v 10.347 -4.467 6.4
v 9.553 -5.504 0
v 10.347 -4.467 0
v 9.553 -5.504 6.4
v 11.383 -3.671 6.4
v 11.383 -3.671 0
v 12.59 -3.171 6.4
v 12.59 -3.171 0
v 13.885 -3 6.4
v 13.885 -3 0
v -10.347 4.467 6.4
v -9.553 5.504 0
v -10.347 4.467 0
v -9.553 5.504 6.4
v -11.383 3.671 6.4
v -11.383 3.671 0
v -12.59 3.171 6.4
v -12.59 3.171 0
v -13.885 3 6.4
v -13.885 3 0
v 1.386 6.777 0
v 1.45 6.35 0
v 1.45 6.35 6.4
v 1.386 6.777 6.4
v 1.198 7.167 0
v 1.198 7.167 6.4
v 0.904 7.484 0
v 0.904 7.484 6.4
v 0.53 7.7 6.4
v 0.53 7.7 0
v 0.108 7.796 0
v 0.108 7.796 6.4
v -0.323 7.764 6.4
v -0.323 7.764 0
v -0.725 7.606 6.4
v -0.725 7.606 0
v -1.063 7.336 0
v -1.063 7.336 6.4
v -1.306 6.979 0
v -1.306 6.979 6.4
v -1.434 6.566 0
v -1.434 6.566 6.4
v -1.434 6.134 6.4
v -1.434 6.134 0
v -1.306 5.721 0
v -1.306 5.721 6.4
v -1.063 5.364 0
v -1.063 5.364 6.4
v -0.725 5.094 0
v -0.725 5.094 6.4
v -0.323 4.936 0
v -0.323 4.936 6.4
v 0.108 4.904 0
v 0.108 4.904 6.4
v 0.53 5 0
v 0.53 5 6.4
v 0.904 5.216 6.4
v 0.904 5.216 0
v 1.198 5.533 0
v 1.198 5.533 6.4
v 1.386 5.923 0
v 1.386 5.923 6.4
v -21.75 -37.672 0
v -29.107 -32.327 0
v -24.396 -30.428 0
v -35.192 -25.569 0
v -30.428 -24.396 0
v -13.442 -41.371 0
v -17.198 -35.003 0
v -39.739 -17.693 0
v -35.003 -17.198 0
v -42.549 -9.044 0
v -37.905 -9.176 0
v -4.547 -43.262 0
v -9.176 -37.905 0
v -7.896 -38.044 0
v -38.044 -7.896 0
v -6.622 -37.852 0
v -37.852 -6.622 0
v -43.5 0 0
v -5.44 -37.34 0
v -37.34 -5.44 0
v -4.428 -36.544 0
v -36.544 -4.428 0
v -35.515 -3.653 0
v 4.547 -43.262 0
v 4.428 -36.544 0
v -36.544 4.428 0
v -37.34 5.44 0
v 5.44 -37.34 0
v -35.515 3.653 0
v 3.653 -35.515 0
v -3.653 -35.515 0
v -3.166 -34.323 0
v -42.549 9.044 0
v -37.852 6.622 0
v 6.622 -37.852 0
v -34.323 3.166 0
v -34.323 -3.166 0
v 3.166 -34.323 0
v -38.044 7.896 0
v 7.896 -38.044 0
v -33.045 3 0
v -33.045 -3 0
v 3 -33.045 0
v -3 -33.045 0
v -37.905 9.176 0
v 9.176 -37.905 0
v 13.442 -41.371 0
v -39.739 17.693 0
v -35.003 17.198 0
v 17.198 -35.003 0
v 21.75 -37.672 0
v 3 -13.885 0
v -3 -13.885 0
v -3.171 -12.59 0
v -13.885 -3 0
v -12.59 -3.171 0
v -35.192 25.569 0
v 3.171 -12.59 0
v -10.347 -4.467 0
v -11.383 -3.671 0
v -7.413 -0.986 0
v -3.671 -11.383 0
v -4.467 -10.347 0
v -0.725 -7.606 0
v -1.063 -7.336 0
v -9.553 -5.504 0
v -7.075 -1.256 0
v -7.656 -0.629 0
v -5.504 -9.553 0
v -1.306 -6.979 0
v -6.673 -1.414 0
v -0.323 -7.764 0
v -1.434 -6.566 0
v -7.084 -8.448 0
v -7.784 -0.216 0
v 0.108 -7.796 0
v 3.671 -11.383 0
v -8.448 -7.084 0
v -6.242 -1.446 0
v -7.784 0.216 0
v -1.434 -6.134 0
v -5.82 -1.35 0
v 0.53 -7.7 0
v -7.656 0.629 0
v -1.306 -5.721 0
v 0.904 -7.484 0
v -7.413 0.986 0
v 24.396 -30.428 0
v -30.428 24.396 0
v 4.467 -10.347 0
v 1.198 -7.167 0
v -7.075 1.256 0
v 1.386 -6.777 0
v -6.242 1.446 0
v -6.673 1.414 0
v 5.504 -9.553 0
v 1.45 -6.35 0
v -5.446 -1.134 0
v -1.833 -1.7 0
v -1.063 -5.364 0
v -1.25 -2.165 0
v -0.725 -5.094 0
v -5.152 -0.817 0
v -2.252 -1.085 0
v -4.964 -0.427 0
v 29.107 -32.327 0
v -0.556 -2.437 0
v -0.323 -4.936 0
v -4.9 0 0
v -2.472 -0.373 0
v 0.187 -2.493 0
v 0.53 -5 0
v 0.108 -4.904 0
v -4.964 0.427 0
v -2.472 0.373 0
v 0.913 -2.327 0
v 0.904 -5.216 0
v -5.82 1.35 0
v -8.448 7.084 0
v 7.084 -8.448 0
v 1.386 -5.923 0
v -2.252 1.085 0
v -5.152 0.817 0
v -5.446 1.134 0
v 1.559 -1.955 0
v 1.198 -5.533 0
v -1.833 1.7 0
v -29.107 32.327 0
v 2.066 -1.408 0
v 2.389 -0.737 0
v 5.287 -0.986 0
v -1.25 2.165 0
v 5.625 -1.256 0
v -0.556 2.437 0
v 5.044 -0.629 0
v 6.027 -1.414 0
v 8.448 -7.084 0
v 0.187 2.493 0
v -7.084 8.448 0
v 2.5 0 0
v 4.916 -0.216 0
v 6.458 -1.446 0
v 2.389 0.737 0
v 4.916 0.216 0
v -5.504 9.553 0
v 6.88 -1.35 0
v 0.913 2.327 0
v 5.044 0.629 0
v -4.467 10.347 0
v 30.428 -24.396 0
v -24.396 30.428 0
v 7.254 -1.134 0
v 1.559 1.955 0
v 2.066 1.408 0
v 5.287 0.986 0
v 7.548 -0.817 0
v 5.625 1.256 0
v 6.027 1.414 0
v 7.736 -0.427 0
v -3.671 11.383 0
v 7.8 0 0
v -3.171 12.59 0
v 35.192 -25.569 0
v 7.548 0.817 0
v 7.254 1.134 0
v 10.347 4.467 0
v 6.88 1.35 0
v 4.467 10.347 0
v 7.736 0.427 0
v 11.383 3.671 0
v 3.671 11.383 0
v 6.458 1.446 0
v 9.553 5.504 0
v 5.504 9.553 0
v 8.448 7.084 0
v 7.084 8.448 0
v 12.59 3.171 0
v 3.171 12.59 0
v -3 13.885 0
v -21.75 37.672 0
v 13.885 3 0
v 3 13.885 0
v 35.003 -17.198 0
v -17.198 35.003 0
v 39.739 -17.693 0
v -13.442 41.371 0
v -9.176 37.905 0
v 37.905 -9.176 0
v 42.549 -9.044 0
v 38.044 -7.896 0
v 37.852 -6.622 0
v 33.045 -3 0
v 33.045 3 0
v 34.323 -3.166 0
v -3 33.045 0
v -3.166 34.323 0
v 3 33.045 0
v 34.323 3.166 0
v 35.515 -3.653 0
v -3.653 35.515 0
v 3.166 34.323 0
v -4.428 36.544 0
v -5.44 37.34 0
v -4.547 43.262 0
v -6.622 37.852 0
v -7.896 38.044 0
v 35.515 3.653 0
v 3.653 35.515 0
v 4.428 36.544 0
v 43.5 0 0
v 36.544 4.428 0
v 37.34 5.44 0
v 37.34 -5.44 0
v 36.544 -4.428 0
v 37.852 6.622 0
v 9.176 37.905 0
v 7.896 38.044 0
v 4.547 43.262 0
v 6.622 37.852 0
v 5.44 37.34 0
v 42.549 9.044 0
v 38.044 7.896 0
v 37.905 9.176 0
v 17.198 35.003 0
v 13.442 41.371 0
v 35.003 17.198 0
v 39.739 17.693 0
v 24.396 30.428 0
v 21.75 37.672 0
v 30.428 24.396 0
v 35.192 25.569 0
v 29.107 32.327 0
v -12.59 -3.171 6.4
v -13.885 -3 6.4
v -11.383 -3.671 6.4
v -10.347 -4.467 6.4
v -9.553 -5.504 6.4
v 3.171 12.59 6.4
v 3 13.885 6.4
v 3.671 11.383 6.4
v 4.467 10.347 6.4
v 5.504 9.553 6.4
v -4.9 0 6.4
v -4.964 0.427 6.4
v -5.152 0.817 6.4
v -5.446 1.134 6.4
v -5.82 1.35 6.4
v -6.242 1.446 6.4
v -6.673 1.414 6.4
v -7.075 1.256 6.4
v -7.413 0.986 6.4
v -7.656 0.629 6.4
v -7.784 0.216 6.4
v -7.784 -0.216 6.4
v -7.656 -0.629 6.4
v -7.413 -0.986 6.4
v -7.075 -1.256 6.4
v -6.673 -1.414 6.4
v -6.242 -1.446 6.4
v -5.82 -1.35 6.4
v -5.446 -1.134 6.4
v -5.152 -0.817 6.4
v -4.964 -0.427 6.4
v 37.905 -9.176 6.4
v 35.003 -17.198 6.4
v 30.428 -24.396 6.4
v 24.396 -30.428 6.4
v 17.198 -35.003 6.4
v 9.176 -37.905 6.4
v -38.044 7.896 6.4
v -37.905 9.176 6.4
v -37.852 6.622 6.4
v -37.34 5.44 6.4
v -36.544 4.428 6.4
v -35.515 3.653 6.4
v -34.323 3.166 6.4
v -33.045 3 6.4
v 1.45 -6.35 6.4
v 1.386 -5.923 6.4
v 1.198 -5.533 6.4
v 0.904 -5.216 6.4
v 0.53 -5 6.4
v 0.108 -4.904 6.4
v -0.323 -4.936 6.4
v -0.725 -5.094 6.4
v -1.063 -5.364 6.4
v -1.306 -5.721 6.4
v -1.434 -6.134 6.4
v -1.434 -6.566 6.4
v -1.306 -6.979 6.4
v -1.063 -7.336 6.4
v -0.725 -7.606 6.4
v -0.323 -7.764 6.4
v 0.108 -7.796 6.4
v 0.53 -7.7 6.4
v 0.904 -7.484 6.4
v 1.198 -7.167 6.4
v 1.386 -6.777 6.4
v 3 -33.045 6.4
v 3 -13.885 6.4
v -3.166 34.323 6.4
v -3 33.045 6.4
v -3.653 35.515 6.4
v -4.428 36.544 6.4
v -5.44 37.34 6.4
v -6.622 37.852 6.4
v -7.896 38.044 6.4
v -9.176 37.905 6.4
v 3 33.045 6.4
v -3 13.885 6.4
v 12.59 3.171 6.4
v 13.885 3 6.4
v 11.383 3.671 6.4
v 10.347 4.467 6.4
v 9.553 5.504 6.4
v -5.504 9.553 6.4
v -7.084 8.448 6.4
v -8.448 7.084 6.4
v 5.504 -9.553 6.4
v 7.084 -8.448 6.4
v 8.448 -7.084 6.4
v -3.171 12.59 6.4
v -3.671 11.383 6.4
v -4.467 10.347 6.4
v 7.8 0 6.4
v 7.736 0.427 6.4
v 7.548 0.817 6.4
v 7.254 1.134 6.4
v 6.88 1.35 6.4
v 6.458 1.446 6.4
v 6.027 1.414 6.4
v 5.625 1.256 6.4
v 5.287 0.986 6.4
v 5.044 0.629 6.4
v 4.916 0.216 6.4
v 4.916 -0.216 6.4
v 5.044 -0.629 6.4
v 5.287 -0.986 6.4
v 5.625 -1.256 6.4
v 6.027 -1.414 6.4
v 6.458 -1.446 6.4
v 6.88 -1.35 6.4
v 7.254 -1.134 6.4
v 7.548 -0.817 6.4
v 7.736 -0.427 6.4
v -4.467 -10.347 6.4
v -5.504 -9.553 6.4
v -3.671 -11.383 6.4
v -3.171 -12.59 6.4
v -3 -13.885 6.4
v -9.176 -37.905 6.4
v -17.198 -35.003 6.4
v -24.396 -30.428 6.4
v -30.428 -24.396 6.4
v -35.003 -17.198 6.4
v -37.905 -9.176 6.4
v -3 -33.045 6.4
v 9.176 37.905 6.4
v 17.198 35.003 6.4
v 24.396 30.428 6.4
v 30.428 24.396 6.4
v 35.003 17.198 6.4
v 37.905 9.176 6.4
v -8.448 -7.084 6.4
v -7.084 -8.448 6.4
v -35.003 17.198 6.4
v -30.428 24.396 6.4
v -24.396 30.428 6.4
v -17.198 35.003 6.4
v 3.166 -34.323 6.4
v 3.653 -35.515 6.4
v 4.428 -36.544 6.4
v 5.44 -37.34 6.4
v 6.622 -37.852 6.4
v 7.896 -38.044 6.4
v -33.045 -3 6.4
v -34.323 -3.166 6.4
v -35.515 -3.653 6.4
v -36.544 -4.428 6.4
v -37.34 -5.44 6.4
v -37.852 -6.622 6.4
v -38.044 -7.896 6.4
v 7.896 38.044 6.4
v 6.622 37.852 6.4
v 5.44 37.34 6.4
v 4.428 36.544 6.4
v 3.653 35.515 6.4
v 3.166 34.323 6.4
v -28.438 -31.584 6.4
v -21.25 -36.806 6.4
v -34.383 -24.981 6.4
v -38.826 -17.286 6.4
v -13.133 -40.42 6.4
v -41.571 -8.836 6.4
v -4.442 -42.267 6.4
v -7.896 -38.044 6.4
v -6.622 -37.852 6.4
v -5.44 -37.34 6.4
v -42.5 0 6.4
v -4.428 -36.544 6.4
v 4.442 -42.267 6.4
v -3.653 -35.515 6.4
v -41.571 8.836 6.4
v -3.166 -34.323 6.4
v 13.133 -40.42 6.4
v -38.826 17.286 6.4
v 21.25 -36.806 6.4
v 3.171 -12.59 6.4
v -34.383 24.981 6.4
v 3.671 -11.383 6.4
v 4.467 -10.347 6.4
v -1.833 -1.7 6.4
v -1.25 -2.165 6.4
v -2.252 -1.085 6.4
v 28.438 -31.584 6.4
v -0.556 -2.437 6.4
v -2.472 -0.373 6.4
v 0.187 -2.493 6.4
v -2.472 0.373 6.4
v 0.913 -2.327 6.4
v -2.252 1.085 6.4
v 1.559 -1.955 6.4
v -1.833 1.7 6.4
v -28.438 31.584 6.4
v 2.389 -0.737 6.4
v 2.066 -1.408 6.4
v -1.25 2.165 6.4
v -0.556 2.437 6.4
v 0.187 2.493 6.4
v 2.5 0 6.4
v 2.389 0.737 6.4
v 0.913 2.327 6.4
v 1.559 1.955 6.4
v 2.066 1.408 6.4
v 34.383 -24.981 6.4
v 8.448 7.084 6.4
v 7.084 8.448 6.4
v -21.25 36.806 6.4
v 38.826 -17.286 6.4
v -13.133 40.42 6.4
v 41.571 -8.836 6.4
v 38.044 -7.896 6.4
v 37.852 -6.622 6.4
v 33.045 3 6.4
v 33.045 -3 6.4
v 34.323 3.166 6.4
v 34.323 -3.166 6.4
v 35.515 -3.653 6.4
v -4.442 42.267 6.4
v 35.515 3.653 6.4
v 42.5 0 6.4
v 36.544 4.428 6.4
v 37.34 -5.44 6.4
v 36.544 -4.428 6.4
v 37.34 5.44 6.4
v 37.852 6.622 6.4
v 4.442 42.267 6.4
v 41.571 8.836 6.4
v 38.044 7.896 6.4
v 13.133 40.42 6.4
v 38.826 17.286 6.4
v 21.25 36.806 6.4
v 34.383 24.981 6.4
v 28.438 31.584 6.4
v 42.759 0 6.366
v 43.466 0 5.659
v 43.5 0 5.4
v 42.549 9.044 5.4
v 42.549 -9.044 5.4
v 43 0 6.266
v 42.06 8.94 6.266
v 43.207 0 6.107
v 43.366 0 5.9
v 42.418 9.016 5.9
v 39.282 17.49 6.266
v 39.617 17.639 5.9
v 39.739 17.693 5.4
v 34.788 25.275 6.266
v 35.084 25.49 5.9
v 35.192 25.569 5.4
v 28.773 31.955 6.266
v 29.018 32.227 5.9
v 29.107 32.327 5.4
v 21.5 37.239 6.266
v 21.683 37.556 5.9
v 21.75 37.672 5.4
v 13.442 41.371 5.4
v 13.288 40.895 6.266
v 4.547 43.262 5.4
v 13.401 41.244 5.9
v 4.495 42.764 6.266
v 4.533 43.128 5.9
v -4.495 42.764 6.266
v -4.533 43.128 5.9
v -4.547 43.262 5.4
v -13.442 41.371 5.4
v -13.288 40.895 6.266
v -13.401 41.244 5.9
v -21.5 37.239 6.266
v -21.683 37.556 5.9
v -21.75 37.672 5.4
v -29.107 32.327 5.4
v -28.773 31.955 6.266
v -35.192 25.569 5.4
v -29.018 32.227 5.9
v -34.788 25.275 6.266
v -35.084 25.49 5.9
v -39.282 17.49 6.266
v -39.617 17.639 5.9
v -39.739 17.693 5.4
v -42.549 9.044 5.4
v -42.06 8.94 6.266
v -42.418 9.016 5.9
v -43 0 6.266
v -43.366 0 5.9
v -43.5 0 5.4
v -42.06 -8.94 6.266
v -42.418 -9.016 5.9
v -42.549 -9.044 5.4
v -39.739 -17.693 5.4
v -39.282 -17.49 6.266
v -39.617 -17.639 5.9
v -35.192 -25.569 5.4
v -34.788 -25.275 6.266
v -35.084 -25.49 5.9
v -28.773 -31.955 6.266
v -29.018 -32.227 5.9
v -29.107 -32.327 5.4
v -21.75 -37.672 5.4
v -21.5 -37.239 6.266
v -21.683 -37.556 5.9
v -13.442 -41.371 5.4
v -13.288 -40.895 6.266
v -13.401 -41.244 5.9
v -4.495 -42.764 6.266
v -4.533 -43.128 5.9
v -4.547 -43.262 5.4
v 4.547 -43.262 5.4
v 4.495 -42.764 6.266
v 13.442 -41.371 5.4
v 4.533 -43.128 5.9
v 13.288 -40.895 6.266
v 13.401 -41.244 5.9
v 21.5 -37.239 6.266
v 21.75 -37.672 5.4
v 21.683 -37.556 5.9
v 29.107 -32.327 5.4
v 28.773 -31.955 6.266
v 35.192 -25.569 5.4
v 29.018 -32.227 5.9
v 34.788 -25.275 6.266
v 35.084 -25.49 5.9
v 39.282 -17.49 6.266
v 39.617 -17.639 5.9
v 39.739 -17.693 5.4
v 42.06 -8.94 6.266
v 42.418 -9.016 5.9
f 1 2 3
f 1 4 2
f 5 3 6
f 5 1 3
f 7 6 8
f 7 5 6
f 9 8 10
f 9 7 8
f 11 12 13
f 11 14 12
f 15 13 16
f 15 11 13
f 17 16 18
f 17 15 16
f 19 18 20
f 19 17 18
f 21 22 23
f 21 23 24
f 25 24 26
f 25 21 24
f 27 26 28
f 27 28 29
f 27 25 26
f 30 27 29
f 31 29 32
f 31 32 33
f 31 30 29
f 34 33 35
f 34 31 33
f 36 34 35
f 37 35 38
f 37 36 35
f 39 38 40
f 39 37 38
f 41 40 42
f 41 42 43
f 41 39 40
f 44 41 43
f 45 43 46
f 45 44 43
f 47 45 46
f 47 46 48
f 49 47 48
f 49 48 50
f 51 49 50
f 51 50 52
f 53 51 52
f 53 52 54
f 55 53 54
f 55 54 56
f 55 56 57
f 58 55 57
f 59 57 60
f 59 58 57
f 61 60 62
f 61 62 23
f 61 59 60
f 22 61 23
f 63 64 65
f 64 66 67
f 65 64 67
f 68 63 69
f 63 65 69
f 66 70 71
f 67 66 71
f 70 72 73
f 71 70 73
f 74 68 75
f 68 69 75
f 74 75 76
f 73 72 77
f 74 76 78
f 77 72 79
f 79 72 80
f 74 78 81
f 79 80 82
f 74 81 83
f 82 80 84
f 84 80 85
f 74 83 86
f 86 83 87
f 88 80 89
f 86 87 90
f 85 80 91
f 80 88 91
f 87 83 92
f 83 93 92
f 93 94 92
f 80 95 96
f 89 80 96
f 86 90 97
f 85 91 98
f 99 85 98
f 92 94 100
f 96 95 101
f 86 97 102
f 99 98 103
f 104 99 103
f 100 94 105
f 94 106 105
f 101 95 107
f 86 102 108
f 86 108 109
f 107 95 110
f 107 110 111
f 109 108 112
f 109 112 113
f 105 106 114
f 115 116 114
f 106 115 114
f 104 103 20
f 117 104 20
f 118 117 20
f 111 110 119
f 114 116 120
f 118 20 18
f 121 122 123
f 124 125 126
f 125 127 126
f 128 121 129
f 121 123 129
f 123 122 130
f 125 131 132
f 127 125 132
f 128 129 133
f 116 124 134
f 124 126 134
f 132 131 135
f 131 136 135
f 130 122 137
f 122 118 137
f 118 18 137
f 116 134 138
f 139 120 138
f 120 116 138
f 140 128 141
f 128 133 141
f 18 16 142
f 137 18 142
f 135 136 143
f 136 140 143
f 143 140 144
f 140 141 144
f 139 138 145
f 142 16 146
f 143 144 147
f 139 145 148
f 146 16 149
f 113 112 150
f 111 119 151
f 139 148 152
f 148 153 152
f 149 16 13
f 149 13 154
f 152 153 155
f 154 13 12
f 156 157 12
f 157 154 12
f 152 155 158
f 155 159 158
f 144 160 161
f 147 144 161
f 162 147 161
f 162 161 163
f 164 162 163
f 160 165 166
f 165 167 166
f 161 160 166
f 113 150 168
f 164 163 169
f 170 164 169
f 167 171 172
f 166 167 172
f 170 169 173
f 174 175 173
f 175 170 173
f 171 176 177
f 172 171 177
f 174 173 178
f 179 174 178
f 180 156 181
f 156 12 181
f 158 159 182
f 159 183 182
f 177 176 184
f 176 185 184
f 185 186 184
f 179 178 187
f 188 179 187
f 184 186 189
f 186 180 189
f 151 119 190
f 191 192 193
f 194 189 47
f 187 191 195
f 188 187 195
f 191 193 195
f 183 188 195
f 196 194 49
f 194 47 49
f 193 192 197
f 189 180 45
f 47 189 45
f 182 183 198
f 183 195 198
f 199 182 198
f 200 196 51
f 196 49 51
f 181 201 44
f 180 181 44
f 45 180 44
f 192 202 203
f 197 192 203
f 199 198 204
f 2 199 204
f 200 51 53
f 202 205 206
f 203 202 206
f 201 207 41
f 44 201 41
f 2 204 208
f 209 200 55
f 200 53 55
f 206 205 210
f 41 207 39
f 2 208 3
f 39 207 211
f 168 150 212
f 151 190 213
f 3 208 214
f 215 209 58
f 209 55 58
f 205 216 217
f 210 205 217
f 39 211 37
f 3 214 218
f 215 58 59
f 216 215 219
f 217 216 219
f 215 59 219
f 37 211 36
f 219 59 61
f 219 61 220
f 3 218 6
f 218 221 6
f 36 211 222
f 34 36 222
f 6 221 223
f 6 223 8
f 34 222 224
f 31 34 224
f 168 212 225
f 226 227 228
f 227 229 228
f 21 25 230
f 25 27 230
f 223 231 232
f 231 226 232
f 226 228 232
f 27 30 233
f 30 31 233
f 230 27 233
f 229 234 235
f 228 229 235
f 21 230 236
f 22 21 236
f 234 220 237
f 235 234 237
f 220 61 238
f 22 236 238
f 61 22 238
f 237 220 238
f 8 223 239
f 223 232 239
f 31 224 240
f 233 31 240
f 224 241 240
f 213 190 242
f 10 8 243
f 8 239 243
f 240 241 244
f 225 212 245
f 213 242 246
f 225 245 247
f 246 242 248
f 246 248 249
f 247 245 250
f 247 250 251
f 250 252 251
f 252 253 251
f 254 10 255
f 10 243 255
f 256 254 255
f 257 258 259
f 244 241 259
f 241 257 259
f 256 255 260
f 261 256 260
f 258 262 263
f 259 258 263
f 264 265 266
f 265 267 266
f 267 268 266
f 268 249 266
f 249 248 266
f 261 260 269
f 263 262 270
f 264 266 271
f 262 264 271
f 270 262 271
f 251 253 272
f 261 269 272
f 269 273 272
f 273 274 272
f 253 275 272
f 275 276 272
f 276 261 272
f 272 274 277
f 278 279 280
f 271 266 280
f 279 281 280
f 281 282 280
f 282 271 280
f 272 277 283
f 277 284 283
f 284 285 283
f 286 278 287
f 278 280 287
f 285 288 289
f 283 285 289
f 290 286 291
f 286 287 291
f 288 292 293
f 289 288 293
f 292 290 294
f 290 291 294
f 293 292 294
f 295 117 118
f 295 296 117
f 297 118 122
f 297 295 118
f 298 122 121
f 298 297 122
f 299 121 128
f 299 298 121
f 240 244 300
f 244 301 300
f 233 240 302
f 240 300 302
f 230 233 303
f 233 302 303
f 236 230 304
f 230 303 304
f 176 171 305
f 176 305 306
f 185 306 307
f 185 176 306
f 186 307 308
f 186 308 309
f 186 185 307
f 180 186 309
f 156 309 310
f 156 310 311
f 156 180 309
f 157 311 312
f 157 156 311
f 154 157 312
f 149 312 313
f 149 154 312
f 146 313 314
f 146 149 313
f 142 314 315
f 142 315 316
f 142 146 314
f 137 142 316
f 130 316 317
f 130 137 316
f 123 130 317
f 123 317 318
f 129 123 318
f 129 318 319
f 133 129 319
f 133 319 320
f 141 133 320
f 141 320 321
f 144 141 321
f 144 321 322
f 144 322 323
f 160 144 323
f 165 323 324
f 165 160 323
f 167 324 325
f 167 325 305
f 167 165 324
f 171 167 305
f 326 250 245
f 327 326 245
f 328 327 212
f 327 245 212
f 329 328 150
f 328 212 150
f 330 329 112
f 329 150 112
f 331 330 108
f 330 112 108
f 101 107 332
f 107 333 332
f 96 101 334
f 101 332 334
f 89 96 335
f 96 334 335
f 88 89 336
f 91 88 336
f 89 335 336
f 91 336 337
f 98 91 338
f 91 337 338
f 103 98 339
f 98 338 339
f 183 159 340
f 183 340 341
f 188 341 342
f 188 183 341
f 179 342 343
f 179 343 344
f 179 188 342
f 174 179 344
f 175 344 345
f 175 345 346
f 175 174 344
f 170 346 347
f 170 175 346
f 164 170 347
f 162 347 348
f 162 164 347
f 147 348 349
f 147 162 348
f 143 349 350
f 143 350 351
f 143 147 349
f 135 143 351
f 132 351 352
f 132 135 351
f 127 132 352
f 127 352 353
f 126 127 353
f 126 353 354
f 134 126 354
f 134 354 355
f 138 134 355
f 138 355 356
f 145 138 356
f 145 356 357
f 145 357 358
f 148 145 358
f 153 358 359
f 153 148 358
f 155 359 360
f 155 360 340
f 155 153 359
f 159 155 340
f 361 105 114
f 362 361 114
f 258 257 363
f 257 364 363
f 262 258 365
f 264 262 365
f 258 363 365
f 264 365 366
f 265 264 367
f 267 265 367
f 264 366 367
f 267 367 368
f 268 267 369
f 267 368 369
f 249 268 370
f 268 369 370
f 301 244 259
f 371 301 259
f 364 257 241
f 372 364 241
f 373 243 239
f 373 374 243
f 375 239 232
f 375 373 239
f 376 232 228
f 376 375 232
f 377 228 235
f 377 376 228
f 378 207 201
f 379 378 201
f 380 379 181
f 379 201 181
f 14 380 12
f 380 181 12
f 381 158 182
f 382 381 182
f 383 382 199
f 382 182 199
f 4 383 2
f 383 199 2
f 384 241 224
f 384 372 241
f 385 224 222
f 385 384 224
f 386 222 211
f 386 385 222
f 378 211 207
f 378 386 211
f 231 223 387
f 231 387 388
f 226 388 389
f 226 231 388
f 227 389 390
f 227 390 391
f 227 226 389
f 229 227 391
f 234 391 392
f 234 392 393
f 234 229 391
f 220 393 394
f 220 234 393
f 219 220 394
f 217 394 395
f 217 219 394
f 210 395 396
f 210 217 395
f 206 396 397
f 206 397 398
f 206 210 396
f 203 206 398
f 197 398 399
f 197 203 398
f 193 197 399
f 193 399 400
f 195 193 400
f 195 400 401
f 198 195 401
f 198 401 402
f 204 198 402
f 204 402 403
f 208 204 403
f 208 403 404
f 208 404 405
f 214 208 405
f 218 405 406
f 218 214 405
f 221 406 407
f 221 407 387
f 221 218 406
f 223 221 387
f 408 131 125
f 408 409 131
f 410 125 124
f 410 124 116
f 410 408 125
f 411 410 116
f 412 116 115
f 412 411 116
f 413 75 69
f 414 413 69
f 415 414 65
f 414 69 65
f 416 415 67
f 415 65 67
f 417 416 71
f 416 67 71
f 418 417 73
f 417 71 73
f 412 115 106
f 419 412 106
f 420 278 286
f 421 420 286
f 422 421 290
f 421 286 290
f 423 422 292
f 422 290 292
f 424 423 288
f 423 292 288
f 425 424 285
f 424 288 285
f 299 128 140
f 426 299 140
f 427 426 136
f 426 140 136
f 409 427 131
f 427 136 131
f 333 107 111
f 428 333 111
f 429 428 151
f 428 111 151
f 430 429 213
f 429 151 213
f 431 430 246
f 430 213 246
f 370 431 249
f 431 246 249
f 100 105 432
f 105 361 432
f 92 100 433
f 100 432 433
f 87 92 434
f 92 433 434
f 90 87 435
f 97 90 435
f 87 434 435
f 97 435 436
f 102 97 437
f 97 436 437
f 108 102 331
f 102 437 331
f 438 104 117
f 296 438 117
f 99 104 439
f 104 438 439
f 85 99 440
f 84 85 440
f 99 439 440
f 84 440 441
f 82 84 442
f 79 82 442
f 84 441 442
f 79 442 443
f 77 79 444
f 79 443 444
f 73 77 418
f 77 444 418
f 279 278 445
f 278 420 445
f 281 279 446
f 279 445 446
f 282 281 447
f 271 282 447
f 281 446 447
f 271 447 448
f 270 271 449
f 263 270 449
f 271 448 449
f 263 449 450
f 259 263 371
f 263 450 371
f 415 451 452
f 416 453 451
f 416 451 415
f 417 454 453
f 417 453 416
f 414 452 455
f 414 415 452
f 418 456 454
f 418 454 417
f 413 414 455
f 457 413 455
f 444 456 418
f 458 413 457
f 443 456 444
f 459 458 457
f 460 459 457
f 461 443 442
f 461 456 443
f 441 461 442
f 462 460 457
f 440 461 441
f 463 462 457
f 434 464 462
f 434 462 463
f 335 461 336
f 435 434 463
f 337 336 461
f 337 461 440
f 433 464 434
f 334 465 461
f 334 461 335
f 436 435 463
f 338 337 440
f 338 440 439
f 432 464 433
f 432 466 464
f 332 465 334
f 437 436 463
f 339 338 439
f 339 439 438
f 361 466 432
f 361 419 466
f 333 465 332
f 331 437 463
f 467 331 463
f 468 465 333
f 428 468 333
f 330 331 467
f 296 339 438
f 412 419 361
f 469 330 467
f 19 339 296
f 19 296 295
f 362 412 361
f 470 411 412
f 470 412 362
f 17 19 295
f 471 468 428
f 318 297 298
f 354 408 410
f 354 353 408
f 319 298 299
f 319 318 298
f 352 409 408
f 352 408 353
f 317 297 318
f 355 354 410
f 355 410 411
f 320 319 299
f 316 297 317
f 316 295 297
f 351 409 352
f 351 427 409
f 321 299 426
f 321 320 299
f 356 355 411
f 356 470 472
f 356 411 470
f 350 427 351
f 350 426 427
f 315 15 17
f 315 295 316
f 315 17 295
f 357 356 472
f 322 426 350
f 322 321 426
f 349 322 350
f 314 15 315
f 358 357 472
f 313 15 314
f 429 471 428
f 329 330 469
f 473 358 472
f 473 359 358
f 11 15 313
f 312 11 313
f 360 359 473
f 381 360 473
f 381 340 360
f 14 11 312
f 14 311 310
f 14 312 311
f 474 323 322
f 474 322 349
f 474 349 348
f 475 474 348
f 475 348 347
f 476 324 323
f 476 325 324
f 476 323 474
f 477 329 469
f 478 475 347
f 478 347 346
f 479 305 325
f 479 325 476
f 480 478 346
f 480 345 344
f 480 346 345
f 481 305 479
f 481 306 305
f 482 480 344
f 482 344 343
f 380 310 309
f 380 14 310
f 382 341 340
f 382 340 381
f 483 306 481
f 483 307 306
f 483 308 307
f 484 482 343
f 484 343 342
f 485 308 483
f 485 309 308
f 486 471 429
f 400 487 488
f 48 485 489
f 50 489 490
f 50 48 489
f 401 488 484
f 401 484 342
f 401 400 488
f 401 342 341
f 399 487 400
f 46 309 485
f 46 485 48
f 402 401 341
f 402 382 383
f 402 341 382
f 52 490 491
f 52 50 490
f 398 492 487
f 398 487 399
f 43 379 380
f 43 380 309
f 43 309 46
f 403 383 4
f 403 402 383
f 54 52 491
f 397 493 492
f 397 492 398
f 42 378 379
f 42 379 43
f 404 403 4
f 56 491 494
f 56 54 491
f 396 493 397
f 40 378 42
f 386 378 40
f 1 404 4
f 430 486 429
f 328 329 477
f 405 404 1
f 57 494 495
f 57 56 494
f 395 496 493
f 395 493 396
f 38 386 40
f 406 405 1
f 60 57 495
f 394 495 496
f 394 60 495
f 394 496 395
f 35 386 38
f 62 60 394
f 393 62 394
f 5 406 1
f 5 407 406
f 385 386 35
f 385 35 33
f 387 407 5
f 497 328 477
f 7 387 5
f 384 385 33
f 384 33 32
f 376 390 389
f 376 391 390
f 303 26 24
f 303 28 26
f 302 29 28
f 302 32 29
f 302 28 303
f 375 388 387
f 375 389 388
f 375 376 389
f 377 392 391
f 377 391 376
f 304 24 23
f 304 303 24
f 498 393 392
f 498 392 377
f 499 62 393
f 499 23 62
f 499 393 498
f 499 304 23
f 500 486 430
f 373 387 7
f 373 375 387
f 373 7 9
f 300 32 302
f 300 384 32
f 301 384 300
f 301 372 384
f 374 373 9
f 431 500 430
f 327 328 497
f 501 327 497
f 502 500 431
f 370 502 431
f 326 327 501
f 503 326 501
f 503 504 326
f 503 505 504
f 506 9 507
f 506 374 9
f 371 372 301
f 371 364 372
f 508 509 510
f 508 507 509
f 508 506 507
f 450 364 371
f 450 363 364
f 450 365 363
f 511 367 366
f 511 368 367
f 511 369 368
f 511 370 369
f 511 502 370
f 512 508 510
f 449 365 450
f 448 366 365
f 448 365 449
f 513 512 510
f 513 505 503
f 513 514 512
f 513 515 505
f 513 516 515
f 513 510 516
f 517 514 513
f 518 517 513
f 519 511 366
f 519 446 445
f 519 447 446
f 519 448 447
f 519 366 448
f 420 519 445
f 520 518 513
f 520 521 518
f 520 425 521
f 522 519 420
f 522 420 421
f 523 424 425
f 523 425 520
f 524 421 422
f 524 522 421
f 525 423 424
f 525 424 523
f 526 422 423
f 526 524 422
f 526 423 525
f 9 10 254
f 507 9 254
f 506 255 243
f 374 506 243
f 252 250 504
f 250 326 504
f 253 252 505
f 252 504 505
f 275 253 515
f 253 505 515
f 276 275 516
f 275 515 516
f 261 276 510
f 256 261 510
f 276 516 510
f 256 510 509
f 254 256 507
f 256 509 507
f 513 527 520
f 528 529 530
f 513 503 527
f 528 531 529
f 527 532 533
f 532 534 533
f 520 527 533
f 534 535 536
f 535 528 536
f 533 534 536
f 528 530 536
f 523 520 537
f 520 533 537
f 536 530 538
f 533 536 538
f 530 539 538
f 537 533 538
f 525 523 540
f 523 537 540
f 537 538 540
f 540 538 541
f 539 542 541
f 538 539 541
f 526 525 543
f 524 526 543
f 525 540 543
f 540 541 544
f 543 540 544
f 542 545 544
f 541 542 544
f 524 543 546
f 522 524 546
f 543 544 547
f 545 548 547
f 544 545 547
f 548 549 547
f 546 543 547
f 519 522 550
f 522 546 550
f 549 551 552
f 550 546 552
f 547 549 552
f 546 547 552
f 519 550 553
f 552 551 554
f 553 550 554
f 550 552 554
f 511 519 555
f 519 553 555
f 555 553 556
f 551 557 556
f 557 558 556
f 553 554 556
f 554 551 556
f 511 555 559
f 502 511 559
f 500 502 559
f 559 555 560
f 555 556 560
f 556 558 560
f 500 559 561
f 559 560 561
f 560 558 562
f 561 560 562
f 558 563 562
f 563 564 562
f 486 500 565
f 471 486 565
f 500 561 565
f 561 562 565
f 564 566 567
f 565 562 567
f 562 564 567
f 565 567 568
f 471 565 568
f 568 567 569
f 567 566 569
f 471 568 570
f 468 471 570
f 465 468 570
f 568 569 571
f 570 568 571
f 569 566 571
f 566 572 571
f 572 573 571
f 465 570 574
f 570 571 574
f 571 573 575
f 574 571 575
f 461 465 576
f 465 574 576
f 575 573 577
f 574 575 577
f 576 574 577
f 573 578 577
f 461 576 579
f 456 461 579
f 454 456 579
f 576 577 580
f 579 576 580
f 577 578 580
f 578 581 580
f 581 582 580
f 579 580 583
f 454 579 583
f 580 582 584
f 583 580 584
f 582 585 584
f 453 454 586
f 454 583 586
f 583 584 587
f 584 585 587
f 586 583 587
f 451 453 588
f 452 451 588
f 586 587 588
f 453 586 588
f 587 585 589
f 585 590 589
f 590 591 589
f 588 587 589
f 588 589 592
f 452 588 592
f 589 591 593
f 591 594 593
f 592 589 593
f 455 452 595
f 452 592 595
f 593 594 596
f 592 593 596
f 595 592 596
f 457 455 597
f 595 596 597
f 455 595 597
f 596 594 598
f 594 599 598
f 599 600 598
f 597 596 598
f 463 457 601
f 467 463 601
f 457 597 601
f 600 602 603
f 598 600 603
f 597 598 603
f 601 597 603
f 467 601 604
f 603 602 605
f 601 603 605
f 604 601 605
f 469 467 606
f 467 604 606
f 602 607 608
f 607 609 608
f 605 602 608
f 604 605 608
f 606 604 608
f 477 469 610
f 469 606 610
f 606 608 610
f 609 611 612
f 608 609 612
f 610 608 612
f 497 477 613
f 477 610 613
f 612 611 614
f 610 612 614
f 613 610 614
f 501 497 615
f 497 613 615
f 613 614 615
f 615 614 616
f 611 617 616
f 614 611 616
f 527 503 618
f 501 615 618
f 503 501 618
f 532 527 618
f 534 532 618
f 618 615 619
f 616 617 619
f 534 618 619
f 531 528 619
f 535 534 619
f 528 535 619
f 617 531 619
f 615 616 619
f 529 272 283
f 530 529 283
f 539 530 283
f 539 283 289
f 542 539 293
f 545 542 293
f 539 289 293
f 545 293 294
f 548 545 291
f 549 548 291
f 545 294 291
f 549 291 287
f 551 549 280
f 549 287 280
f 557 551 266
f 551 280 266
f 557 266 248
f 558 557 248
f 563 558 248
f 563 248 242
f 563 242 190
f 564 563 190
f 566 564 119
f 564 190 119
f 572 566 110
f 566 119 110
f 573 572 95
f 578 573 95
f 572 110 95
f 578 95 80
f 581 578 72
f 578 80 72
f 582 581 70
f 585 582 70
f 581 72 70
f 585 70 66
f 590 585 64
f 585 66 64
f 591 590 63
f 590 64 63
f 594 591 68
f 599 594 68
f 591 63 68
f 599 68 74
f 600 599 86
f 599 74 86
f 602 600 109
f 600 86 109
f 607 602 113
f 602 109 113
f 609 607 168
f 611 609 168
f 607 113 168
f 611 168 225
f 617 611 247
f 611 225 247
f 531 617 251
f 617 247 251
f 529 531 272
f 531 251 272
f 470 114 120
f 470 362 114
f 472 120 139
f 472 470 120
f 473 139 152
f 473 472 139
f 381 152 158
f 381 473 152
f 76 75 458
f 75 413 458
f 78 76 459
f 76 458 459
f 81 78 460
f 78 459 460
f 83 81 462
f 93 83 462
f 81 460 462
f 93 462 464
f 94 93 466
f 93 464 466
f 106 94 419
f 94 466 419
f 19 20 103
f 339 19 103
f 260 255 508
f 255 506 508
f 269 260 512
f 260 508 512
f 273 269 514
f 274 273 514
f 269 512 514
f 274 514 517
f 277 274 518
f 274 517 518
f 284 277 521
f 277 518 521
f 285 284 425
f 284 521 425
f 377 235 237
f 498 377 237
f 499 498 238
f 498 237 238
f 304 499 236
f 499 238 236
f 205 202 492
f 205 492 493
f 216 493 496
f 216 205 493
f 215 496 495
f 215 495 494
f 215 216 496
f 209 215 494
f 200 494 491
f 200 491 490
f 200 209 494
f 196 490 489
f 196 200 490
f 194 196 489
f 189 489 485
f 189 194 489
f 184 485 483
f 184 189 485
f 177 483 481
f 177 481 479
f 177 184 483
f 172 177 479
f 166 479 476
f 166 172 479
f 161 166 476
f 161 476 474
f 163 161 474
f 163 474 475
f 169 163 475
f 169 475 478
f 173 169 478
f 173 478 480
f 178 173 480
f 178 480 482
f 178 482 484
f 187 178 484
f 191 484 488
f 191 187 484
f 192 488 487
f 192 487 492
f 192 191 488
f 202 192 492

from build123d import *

# Parameters (mm, degrees)
F0_R     = 43.5
F0_R_2   = 1.45
F0_R_3   = 2.5
F1_DEPTH = 6.4
F2_R     = 5
F3_R     = 1


with BuildPart() as f1:
    # F0 (on Top) → F1 (new body)
    with BuildSketch(Plane.XY):
        Circle(F0_R)
        with BuildLine():
            ThreePointArc((-10.608988, -3), (-7.795852, -7.795852), (-3, -10.608988))
            Line((-3, -10.608988), (-3, -38.884444))
            ThreePointArc((-3, -38.884444), (-27.577164, -27.577164), (-38.884444, -3))
            Line((-38.884444, -3), (-10.608988, -3))
        make_face(mode=Mode.SUBTRACT)
        with BuildLine():
            ThreePointArc((3, -10.608988), (7.795852, -7.795852), (10.608988, -3))
            Line((10.608988, -3), (38.884444, -3))
            ThreePointArc((38.884444, -3), (27.577164, -27.577164), (3, -38.884444))
            Line((3, -38.884444), (3, -10.608988))
        make_face(mode=Mode.SUBTRACT)
        with Locations((0, -6.35)):
            Circle(F0_R_2, mode=Mode.SUBTRACT)
        with Locations((-6.35, 0)):
            Circle(F0_R_2, mode=Mode.SUBTRACT)
        with BuildLine():
            ThreePointArc((-3, 10.608988), (-7.795852, 7.795852), (-10.608988, 3))
            Line((-10.608988, 3), (-38.884444, 3))
            ThreePointArc((-38.884444, 3), (-27.577164, 27.577164), (-3, 38.884444))
            Line((-3, 38.884444), (-3, 10.608988))
        make_face(mode=Mode.SUBTRACT)
        Circle(F0_R_3, mode=Mode.SUBTRACT)
        with Locations((6.35, 0)):
            Circle(F0_R_2, mode=Mode.SUBTRACT)
        with Locations((0, 6.35)):
            Circle(F0_R_2, mode=Mode.SUBTRACT)
        with BuildLine():
            ThreePointArc((10.608988, 3), (7.795852, 7.795852), (3, 10.608988))
            Line((3, 10.608988), (3, 38.884444))
            ThreePointArc((3, 38.884444), (27.577164, 27.577164), (38.884444, 3))
            Line((38.884444, 3), (10.608988, 3))
        make_face(mode=Mode.SUBTRACT)
    extrude(amount=F1_DEPTH)

    # F2
    f2_edges = [f1.edges().sort_by_distance(p)[0] for p in [
        (-10.608988, -3, 3.2),
        (-3, -10.608988, 3.2),
        (-3, 10.608988, 3.2),
        (-10.608988, 3, 3.2),
        (3, -10.608988, 3.2),
        (10.608988, -3, 3.2),
        (10.608988, 3, 3.2),
        (3, 10.608988, 3.2),
        (-38.884444, -3, 3.2),
        (-3, -38.884444, 3.2),
        (3, -38.884444, 3.2),
        (38.884444, -3, 3.2),
        (38.884444, 3, 3.2),
        (3, 38.884444, 3.2),
        (-3, 38.884444, 3.2),
        (-38.884444, 3, 3.2),
    ]]
    fillet(f2_edges, radius=F2_R)

    # F3
    f3_edges = [f1.edges().sort_by_distance(p)[0] for p in [
        (-43.5, 0, 6.4),
    ]]
    fillet(f3_edges, radius=F3_R)


solid = f1.part
